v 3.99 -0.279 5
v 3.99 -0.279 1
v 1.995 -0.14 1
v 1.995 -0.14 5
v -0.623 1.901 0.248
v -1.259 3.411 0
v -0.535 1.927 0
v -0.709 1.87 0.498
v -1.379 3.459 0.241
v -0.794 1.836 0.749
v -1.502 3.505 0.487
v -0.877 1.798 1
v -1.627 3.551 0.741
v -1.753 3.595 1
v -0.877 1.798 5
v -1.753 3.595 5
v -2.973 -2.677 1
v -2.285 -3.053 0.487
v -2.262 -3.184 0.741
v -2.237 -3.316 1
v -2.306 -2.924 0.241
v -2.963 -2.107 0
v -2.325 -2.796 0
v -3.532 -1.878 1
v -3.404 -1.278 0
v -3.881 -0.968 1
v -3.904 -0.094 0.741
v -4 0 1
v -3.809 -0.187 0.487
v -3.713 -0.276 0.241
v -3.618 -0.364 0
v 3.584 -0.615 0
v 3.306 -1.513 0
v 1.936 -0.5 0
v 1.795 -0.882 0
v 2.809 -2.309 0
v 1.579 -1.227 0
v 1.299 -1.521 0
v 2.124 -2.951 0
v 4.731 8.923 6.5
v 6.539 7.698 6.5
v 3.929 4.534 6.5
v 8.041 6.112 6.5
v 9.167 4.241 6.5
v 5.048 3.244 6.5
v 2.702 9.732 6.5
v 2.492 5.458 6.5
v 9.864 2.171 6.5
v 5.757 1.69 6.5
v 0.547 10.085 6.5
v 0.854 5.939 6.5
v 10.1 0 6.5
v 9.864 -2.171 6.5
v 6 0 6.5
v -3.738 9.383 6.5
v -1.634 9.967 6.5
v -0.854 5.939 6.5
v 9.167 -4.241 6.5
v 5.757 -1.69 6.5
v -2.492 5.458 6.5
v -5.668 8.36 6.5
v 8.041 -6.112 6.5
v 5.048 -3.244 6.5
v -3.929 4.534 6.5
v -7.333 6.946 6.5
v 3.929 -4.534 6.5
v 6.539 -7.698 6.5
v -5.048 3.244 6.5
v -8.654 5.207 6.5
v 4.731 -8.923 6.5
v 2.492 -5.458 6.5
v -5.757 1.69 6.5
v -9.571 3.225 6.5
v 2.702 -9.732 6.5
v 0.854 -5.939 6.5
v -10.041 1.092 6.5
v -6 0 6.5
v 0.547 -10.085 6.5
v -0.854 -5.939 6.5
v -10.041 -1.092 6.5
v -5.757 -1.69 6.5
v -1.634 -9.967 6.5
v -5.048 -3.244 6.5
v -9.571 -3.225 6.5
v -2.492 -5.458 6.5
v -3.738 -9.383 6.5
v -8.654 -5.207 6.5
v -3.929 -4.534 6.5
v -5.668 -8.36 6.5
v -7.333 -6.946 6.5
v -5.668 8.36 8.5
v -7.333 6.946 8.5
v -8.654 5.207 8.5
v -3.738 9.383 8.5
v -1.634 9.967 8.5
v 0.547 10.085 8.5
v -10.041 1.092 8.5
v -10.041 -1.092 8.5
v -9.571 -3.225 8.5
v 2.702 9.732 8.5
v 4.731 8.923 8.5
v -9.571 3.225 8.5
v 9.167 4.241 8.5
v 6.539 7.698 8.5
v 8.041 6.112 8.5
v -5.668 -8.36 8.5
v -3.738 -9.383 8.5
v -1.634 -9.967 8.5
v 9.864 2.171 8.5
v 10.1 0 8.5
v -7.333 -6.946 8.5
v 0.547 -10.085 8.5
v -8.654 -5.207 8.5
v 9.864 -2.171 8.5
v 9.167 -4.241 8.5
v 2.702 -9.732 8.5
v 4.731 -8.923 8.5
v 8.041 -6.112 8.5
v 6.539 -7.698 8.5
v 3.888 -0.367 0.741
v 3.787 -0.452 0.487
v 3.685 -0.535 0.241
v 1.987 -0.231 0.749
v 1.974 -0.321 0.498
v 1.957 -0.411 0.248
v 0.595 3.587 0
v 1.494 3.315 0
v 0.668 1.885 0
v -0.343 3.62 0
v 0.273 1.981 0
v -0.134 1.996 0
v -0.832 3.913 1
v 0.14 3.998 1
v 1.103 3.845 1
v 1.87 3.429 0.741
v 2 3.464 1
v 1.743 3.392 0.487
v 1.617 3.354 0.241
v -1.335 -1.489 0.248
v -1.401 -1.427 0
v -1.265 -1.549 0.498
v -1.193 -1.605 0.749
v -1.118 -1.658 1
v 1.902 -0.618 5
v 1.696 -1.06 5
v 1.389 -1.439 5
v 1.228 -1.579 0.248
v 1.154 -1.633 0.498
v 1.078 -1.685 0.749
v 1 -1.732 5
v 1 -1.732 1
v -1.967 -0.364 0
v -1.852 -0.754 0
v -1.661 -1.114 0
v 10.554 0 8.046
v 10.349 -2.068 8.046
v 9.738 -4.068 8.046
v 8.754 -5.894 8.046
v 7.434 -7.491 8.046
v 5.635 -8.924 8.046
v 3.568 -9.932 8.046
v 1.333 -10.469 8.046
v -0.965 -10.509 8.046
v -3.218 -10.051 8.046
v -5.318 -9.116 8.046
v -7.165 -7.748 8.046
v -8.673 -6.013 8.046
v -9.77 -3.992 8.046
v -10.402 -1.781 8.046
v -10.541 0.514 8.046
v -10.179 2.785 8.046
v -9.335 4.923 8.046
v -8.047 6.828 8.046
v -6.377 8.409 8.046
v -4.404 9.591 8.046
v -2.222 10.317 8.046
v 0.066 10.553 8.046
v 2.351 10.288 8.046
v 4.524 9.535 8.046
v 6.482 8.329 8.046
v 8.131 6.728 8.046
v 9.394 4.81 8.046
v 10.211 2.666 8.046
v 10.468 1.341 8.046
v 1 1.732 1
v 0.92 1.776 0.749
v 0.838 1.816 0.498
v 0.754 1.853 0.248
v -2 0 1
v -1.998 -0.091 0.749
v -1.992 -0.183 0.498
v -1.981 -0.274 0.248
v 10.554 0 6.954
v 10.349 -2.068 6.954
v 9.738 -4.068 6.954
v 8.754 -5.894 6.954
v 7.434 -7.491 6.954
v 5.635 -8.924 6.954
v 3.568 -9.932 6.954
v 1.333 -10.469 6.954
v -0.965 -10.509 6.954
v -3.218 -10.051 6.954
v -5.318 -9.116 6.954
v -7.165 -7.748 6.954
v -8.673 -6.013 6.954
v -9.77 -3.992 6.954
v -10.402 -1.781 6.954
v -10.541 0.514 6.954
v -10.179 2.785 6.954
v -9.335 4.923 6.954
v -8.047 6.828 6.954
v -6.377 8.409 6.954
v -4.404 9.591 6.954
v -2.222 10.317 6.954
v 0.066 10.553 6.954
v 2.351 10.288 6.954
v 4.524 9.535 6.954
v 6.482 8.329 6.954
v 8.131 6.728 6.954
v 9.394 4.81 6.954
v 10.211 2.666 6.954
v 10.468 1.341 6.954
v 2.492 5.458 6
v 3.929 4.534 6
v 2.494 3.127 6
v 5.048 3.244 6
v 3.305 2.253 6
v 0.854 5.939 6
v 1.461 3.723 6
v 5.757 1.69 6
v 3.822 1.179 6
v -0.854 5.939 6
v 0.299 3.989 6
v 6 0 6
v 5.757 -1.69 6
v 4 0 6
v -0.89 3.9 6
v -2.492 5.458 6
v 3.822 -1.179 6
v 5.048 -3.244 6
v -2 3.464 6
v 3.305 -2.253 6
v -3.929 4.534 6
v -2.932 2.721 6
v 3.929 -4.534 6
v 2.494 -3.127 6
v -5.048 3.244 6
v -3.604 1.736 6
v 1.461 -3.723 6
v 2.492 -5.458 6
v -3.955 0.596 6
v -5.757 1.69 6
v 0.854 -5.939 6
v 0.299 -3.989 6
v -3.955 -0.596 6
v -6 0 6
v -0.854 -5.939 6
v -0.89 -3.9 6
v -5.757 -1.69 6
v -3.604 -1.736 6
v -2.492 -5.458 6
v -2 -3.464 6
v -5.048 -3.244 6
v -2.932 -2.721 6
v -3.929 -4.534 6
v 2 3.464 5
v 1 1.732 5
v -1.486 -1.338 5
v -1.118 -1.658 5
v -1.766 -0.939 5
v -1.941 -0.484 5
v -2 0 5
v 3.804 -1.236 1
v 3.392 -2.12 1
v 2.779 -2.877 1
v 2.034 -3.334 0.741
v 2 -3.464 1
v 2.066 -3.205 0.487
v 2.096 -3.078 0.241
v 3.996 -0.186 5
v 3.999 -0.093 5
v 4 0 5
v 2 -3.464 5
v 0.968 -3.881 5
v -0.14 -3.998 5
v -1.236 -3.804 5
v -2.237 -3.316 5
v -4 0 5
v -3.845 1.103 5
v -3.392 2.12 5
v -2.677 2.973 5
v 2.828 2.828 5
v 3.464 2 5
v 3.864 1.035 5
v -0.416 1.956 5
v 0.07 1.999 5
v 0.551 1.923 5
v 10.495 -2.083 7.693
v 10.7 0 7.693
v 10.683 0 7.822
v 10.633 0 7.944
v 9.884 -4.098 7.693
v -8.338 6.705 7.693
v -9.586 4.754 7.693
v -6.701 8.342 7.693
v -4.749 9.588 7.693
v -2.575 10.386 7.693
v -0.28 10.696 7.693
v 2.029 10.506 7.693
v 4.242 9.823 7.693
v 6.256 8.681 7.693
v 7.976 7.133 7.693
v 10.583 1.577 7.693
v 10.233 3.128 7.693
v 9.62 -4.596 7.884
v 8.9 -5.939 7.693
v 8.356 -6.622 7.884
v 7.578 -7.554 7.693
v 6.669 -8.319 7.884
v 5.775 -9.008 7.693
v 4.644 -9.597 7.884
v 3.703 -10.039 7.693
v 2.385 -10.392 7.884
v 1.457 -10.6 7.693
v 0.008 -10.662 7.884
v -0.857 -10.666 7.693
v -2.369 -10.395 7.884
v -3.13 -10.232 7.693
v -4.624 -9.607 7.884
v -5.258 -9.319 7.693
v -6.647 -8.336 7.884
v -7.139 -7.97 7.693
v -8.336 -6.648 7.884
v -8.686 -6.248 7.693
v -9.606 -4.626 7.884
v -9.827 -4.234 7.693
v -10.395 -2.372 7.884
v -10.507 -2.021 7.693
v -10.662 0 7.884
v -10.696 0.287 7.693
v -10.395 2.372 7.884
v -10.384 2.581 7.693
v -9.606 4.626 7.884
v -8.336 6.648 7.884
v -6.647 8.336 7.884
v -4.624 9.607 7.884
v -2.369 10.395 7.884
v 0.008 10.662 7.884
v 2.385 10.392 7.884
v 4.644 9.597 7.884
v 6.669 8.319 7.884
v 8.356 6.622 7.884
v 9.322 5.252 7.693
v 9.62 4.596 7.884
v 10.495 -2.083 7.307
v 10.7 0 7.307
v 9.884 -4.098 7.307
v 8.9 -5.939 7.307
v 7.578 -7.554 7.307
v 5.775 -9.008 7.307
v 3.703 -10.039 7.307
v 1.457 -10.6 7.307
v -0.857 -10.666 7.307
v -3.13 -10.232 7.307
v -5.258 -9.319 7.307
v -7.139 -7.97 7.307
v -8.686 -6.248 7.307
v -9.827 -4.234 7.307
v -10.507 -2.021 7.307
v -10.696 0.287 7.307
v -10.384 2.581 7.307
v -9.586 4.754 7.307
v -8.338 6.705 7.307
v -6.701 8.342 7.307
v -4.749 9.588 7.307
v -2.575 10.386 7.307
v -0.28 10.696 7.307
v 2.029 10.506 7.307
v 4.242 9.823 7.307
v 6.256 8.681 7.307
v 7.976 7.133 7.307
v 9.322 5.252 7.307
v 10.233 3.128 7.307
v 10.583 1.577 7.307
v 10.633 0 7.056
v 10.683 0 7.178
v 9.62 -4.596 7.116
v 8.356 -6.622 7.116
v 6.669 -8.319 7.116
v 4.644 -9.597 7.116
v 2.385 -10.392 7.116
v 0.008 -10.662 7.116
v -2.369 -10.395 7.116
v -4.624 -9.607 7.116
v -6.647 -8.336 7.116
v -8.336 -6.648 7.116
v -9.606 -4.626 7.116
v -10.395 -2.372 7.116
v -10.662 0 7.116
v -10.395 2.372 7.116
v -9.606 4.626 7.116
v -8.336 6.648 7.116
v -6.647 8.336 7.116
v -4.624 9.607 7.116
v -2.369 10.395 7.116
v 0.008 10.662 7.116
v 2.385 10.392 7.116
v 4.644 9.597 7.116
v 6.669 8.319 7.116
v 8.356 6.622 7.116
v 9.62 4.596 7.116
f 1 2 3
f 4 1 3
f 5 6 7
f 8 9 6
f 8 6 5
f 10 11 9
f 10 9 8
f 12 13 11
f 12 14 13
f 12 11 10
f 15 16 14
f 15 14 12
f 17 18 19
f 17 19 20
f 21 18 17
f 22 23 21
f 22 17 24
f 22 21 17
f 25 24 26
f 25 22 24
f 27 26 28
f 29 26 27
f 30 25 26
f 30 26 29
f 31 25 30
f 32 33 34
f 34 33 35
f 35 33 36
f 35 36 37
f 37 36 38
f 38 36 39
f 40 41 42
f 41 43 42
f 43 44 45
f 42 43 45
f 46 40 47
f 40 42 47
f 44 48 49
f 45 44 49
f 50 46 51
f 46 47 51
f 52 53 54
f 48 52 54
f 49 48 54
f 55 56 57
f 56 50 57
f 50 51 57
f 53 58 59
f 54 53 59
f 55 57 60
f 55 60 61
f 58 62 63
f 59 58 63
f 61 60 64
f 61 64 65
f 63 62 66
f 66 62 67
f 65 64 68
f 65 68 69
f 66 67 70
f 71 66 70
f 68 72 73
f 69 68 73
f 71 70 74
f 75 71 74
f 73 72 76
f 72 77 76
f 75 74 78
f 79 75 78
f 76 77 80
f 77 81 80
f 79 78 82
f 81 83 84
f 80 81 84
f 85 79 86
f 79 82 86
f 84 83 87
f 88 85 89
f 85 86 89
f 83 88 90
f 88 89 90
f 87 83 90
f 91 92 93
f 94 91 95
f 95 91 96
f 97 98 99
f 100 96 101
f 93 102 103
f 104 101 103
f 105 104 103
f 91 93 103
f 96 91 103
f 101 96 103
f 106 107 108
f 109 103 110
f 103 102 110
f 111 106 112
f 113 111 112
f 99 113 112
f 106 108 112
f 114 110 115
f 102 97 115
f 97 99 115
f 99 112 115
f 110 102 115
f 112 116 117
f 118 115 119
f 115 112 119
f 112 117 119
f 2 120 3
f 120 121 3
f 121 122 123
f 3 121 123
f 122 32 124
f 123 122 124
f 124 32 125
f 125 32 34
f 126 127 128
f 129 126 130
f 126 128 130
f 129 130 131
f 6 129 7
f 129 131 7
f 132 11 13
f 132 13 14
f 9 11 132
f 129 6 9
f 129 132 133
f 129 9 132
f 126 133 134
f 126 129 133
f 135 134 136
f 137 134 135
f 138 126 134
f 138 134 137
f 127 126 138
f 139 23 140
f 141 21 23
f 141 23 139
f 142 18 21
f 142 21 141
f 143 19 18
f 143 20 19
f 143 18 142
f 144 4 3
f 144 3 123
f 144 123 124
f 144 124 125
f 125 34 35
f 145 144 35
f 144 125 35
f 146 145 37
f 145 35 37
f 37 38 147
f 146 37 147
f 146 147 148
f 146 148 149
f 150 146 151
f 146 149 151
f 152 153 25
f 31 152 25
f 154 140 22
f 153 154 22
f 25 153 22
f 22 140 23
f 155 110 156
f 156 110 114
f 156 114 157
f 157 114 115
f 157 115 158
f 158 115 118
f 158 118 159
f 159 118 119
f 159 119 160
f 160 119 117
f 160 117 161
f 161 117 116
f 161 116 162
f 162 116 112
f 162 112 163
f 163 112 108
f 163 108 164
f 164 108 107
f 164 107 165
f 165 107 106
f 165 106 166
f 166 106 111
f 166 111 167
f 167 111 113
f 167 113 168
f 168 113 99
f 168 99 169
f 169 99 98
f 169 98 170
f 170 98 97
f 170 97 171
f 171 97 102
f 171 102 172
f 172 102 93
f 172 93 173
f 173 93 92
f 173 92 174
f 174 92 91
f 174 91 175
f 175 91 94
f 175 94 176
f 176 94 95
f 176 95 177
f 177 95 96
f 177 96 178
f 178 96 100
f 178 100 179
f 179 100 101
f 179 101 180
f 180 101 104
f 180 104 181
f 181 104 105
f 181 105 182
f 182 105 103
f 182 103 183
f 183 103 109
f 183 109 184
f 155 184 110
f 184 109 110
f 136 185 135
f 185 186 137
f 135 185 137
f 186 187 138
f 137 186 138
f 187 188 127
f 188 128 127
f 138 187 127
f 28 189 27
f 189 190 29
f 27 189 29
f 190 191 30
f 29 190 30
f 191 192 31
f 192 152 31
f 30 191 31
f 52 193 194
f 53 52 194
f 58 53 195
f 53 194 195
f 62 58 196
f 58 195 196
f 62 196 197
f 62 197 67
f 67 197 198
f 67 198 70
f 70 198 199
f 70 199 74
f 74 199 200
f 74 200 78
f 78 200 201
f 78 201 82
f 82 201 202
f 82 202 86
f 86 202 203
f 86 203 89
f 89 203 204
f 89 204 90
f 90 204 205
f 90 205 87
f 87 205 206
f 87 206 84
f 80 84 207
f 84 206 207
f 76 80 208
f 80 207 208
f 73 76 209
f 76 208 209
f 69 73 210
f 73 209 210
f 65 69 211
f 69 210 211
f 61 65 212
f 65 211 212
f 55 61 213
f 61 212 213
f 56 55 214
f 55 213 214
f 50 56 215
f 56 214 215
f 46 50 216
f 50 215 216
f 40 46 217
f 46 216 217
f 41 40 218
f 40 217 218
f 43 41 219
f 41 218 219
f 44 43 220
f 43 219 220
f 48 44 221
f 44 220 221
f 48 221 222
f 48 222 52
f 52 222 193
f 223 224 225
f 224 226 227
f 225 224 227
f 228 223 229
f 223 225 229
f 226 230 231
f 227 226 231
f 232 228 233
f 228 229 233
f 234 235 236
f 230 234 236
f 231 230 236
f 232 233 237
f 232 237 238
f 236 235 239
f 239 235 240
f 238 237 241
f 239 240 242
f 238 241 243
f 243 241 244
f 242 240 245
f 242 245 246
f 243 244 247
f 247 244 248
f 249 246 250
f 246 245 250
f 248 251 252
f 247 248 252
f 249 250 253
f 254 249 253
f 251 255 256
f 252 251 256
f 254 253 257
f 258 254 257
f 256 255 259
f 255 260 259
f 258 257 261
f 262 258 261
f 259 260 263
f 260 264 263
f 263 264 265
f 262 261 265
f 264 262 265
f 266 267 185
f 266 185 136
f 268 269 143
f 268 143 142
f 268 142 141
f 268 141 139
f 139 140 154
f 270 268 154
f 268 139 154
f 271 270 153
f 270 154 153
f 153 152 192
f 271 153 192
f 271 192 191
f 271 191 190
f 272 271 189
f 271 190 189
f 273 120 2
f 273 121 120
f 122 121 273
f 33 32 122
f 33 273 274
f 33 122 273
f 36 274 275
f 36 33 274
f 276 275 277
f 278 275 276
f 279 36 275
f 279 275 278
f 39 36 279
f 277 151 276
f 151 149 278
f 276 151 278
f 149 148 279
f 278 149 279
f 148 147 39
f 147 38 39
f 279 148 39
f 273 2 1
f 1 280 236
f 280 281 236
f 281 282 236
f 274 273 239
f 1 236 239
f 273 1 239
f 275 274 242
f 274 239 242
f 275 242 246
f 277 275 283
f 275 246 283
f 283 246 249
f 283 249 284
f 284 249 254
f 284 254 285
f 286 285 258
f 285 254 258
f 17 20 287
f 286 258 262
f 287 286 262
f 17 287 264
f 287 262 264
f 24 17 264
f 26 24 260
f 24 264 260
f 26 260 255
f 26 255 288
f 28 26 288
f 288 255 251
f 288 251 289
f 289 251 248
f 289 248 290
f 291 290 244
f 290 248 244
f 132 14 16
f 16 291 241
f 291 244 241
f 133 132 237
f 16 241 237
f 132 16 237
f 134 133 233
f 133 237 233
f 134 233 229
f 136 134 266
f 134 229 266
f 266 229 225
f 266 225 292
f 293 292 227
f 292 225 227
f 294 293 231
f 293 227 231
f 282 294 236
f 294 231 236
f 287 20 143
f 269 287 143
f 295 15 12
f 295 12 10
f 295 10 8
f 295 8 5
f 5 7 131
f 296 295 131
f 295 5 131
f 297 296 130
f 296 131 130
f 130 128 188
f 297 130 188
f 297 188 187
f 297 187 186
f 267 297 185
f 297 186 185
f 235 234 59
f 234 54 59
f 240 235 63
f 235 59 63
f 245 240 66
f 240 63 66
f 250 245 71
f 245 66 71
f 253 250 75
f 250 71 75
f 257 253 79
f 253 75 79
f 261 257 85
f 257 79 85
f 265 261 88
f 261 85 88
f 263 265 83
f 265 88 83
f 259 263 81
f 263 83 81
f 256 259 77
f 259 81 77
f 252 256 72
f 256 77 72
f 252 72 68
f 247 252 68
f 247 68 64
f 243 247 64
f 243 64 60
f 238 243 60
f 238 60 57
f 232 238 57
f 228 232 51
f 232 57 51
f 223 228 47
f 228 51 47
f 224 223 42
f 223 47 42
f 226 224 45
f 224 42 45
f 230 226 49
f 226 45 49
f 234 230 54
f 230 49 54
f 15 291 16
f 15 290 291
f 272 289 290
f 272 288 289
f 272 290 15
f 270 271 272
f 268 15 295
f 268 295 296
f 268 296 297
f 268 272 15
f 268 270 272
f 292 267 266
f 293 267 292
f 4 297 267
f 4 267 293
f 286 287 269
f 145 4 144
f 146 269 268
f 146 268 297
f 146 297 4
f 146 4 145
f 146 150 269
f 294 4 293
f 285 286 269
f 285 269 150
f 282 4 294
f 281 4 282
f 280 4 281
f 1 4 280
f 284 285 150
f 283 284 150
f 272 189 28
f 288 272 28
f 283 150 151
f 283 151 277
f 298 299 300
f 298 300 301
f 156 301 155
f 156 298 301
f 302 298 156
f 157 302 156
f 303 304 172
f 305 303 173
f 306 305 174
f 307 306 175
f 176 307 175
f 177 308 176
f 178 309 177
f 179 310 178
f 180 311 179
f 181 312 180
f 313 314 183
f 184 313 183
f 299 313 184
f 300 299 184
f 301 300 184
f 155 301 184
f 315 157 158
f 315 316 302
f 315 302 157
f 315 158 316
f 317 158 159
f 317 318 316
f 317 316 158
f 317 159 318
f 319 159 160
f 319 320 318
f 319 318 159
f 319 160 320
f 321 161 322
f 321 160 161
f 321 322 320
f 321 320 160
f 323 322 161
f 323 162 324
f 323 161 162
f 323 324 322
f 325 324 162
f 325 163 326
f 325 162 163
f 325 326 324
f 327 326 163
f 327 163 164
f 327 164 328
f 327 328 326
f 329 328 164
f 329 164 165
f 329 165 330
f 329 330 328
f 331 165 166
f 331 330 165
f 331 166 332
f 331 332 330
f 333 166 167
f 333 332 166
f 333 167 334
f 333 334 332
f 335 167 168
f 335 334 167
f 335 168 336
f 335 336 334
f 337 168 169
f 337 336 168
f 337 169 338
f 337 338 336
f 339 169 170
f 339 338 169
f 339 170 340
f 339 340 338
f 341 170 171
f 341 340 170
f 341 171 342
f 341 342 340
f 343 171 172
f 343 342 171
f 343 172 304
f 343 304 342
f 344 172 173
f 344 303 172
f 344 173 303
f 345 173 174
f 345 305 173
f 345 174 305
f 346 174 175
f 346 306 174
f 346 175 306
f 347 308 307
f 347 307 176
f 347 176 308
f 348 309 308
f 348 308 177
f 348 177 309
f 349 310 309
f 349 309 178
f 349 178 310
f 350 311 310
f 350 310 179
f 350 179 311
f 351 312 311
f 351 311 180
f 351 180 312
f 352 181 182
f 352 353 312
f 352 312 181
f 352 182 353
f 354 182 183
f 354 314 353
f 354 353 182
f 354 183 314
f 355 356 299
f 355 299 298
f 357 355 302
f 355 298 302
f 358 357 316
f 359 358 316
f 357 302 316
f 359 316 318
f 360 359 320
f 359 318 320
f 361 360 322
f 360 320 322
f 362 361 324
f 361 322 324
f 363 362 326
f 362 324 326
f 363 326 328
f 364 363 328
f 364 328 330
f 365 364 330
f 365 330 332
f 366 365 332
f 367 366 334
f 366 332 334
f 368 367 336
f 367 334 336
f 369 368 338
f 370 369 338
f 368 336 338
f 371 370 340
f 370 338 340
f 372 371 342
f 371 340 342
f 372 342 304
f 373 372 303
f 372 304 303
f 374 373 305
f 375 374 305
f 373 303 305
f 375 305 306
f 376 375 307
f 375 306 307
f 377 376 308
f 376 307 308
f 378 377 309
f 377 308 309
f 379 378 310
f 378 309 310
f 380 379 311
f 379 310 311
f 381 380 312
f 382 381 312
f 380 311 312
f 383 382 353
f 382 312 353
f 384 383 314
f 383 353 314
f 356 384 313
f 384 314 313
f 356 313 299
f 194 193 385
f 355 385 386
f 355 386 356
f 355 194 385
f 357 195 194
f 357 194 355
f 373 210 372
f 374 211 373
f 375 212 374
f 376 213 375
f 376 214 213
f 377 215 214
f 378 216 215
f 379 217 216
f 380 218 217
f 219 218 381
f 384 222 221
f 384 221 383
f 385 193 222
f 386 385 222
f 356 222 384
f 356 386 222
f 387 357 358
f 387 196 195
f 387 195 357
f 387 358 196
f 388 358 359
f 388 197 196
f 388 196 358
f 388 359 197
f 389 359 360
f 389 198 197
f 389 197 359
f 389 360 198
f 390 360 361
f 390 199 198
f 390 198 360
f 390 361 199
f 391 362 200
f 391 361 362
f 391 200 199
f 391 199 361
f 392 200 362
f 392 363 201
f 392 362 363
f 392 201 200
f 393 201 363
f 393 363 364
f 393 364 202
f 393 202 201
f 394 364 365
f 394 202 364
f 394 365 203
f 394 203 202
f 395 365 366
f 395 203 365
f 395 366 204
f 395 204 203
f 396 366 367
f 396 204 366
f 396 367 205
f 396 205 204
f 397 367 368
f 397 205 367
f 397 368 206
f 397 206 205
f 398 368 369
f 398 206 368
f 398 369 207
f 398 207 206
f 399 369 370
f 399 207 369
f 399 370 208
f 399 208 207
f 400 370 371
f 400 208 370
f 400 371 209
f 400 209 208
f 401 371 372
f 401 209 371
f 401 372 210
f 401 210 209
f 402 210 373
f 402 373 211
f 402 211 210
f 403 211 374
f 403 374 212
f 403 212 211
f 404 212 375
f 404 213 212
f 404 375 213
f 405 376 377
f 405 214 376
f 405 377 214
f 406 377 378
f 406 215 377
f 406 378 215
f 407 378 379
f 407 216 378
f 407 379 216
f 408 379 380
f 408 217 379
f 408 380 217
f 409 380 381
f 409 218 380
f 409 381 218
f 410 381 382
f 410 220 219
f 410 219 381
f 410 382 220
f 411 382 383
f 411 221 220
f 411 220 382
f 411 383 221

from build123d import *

# Parameters (mm, degrees)
F3_DEPTH    = 5
F4_C1_SIZE2 = 0.3639702343
F4_C1_SIZE  = 1
F4_C2_SIZE2 = 0.3639702343
F4_C2_SIZE  = 1
F4_C3_SIZE2 = 0.3639702343
F4_C3_SIZE  = 1
F4_C4_SIZE2 = 0.3639702343
F4_C4_SIZE  = 1
F4_C5_SIZE2 = 0.3639702343
F4_C5_SIZE  = 1
F4_C6_SIZE2 = 1
F4_C6_SIZE  = 0.3639702343
F4_C7_SIZE2 = 0.3639702343
F4_C7_SIZE  = 1
F4_C8_SIZE2 = 1
F4_C8_SIZE  = 0.3639702343
F4_C9_SIZE2 = 0.3639702343
F4_C9_SIZE  = 1
F5_SIZE     = 0.6
F6_R        = 0.5


with BuildPart() as f1:
    # F0 (on Front) → F1 (revolve)
    with BuildSketch(Plane.XZ):
        Polygon((10.7, 8.5), (0, 8.5), (0, 5), (2, 5), (2, 0), (4, 0), (4, 6), (6, 6), (6, 6.5), (10.7, 6.5), align=None)
    revolve(axis=Axis((0, 0, 6.75), (0, 0, -1)))

    # F2 (on face) → F3 (cut)
    with BuildSketch(Plane(origin=(0, 0, 0), x_dir=(1, 0, 0), z_dir=(0, 0, -1))):
        with BuildLine():
            ThreePointArc((4, 0), (3.4641016151, -2), (2, -3.4641016151))
            Line((2, -3.4641016151), (3, -5.1961524227))
            Line((3, -5.1961524227), (5.9853843016, 0.4185388425))
            Line((5.9853843016, 0.4185388425), (3.990256201, 0.279025895))
            ThreePointArc((3.990256201, 0.279025895), (3.9975633081, 0.1395979868), (4, 0))
        make_face()
        with BuildLine():
            ThreePointArc((-2.2367716139, 3.3161502902), (-0.1395979868, 3.9975633081), (2, 3.4641016151))
            Line((2, 3.4641016151), (3, 5.1961524227))
            Line((3, 5.1961524227), (-3.3551574208, 4.9742254353))
            Line((-3.3551574208, 4.9742254353), (-2.2367716139, 3.3161502902))
        make_face()
        with BuildLine():
            ThreePointArc((-0.8767422936, -1.7975880926), (-1.6960961923, -1.0598385285), (-2, 0))
            Line((-2, 0), (-4, 0))
            ThreePointArc((-4, 0), (-3.3921923846, -2.1196770569), (-1.7534845872, -3.5951761852))
            Line((-1.7534845872, -3.5951761852), (-0.8767422936, -1.7975880926))
        make_face()
        with BuildLine():
            ThreePointArc((-1.7534845872, -3.5951761852), (-3.3921923846, -2.1196770569), (-4, 0))
            Line((-4, 0), (-6, 0))
            Line((-6, 0), (-2.6302268807, -5.3927642778))
            Line((-2.6302268807, -5.3927642778), (-1.7534845872, -3.5951761852))
        make_face()
        with BuildLine():
            ThreePointArc((2, 0), (1.7320508076, -1), (1, -1.7320508076))
            Line((1, -1.7320508076), (2, -3.4641016151))
            ThreePointArc((2, -3.4641016151), (3.4641016151, -2), (4, 0))
            ThreePointArc((4, 0), (3.9975633081, 0.1395979868), (3.990256201, 0.279025895))
            Line((3.990256201, 0.279025895), (1.9951281005, 0.1395129475))
            ThreePointArc((1.9951281005, 0.1395129475), (1.998781654, 0.0697989934), (2, 0))
        make_face()
        with BuildLine():
            ThreePointArc((-1.1183858069, 1.6580751451), (-0.0697989934, 1.998781654), (1, 1.7320508076))
            Line((1, 1.7320508076), (2, 3.4641016151))
            ThreePointArc((2, 3.4641016151), (-0.1395979868, 3.9975633081), (-2.2367716139, 3.3161502902))
            Line((-2.2367716139, 3.3161502902), (-1.1183858069, 1.6580751451))
        make_face()
        with BuildLine():
            ThreePointArc((-0.4983586629, -1.0217866811), (-0.9640965616, -0.6024343936), (-1.1368418442, 0))
            Line((-1.1368418442, 0), (-2, 0))
            ThreePointArc((-2, 0), (-1.6960961923, -1.0598385285), (-0.8767422936, -1.7975880926))
            Line((-0.8767422936, -1.7975880926), (-0.4983586629, -1.0217866811))
        make_face()
        with BuildLine():
            Line((-0.4983586629, -1.0217866811), (0, 0))
            Line((0, 0), (-1.1368418442, 0))
            ThreePointArc((-1.1368418442, 0), (-0.9640965616, -0.6024343936), (-0.4983586629, -1.0217866811))
        make_face()
        with BuildLine():
            Line((-0.6357138916, 0.9424846029), (0, 0))
            Line((0, 0), (0.5684209221, 0.9845339171))
            ThreePointArc((0.5684209221, 0.9845339171), (-0.0396752082, 1.1361493108), (-0.6357138916, 0.9424846029))
        make_face()
        with BuildLine():
            ThreePointArc((-0.6357138916, 0.9424846029), (-0.0396752082, 1.1361493108), (0.5684209221, 0.9845339171))
            Line((0.5684209221, 0.9845339171), (1, 1.7320508076))
            ThreePointArc((1, 1.7320508076), (-0.0697989934, 1.998781654), (-1.1183858069, 1.6580751451))
            Line((-1.1183858069, 1.6580751451), (-0.6357138916, 0.9424846029))
        make_face()
        with BuildLine():
            Line((1.1340725546, 0.0793020783), (0, 0))
            Line((0, 0), (0.5684209221, -0.9845339171))
            ThreePointArc((0.5684209221, -0.9845339171), (0.9845339171, -0.5684209221), (1.1368418442, 0))
            ThreePointArc((1.1368418442, 0), (1.1361493108, 0.0396752082), (1.1340725546, 0.0793020783))
        make_face()
        with BuildLine():
            ThreePointArc((1.1368418442, 0), (0.9845339171, -0.5684209221), (0.5684209221, -0.9845339171))
            Line((0.5684209221, -0.9845339171), (1, -1.7320508076))
            ThreePointArc((1, -1.7320508076), (1.7320508076, -1), (2, 0))
            ThreePointArc((2, 0), (1.998781654, 0.0697989934), (1.9951281005, 0.1395129475))
            Line((1.9951281005, 0.1395129475), (1.1340725546, 0.0793020783))
            ThreePointArc((1.1340725546, 0.0793020783), (1.1361493108, 0.0396752082), (1.1368418442, 0))
        make_face()
    extrude(amount=-F3_DEPTH, mode=Mode.SUBTRACT)

    # F4: chamfer of 1 x 0.3639702343 on 9 edges, made by hand

    # F4_c1
    f4_c1_edges = [f1.edges().sort_by_distance(p)[0] for p in [
        (0.1395979868, 3.9975633081, 0),
    ]]
    f4_c1_side = f1.faces().sort_by_distance((0.1395979868, 3.9975633081, 0.0072794047))[0]
    chamfer(f4_c1_edges, length=F4_C1_SIZE, length2=F4_C1_SIZE2, reference=f4_c1_side)

    # F4_c2
    f4_c2_edges = [f1.edges().sort_by_distance(p)[0] for p in [
        (-3.5317903714, -1.8778862511, 0),
    ]]
    f4_c2_side = f1.faces().sort_by_distance((-3.5317903714, -1.8778862511, 0.0072794047))[0]
    chamfer(f4_c2_edges, length=F4_C2_SIZE, length2=F4_C2_SIZE2, reference=f4_c2_side)

    # F4_c3
    f4_c3_edges = [f1.edges().sort_by_distance(p)[0] for p in [
        (3.3921923846, -2.1196770569, 0),
    ]]
    f4_c3_side = f1.faces().sort_by_distance((3.3921923846, -2.1196770569, 0.0072794047))[0]
    chamfer(f4_c3_edges, length=F4_C3_SIZE, length2=F4_C3_SIZE2, reference=f4_c3_side)

    # F4_c4
    f4_c4_edges = [f1.edges().sort_by_distance(p)[0] for p in [
        (2.8111503402, -0.1965747812, 0),
    ]]
    f4_c4_side = f1.faces().sort_by_distance((2.8111503402, -0.1965747812, 0.0072794047))[0]
    chamfer(f4_c4_edges, length=F4_C4_SIZE, length2=F4_C4_SIZE2, reference=f4_c4_side)

    # F4_c5
    f4_c5_edges = [f1.edges().sort_by_distance(p)[0] for p in [
        (1.4090074414, 2.4404724768, 0),
    ]]
    f4_c5_side = f1.faces().sort_by_distance((1.4090074414, 2.4404724768, 0.0072794047))[0]
    chamfer(f4_c5_edges, length=F4_C5_SIZE, length2=F4_C5_SIZE2, reference=f4_c5_side)

    # F4_c6
    f4_c6_edges = [f1.edges().sort_by_distance(p)[0] for p in [
        (-1.2353364159, 2.5328149991, 0),
    ]]
    f4_c6_side = f1.faces().sort_by_distance((-1.2287937303, 2.5360060801, 0))[0]
    chamfer(f4_c6_edges, length=F4_C6_SIZE, length2=F4_C6_SIZE2, reference=f4_c6_side)

    # F4_c7
    f4_c7_edges = [f1.edges().sort_by_distance(p)[0] for p in [
        (-2.8180148829, 0, 0),
    ]]
    f4_c7_side = f1.faces().sort_by_distance((-2.8180148829, 0, 0.0072794047))[0]
    chamfer(f4_c7_edges, length=F4_C7_SIZE, length2=F4_C7_SIZE2, reference=f4_c7_side)

    # F4_c8
    f4_c8_edges = [f1.edges().sort_by_distance(p)[0] for p in [
        (-1.5758139244, -2.3362402179, 0),
    ]]
    f4_c8_side = f1.faces().sort_by_distance((-1.5818488244, -2.3321696265, 0))[0]
    chamfer(f4_c8_edges, length=F4_C8_SIZE, length2=F4_C8_SIZE2, reference=f4_c8_side)

    # F4_c9
    f4_c9_edges = [f1.edges().sort_by_distance(p)[0] for p in [
        (1.4090074414, -2.4404724768, 0),
    ]]
    f4_c9_side = f1.faces().sort_by_distance((1.4090074414, -2.4404724768, 0.0072794047))[0]
    chamfer(f4_c9_edges, length=F4_C9_SIZE, length2=F4_C9_SIZE2, reference=f4_c9_side)

    # F5
    f5_edges = [f1.edges().sort_by_distance(p)[0] for p in [
        (-10.7, 0, 8.5),
        (-10.7, 0, 6.5),
    ]]
    chamfer(f5_edges, length=F5_SIZE)

    # F6
    f6_edges = [f1.edges().sort_by_distance(p)[0] for p in [
        (10.7, 0, 7.5),
        (-10.7, 0, 7.1),
        (-10.7, 0, 7.9),
    ]]
    fillet(f6_edges, radius=F6_R)


solid = f1.part
